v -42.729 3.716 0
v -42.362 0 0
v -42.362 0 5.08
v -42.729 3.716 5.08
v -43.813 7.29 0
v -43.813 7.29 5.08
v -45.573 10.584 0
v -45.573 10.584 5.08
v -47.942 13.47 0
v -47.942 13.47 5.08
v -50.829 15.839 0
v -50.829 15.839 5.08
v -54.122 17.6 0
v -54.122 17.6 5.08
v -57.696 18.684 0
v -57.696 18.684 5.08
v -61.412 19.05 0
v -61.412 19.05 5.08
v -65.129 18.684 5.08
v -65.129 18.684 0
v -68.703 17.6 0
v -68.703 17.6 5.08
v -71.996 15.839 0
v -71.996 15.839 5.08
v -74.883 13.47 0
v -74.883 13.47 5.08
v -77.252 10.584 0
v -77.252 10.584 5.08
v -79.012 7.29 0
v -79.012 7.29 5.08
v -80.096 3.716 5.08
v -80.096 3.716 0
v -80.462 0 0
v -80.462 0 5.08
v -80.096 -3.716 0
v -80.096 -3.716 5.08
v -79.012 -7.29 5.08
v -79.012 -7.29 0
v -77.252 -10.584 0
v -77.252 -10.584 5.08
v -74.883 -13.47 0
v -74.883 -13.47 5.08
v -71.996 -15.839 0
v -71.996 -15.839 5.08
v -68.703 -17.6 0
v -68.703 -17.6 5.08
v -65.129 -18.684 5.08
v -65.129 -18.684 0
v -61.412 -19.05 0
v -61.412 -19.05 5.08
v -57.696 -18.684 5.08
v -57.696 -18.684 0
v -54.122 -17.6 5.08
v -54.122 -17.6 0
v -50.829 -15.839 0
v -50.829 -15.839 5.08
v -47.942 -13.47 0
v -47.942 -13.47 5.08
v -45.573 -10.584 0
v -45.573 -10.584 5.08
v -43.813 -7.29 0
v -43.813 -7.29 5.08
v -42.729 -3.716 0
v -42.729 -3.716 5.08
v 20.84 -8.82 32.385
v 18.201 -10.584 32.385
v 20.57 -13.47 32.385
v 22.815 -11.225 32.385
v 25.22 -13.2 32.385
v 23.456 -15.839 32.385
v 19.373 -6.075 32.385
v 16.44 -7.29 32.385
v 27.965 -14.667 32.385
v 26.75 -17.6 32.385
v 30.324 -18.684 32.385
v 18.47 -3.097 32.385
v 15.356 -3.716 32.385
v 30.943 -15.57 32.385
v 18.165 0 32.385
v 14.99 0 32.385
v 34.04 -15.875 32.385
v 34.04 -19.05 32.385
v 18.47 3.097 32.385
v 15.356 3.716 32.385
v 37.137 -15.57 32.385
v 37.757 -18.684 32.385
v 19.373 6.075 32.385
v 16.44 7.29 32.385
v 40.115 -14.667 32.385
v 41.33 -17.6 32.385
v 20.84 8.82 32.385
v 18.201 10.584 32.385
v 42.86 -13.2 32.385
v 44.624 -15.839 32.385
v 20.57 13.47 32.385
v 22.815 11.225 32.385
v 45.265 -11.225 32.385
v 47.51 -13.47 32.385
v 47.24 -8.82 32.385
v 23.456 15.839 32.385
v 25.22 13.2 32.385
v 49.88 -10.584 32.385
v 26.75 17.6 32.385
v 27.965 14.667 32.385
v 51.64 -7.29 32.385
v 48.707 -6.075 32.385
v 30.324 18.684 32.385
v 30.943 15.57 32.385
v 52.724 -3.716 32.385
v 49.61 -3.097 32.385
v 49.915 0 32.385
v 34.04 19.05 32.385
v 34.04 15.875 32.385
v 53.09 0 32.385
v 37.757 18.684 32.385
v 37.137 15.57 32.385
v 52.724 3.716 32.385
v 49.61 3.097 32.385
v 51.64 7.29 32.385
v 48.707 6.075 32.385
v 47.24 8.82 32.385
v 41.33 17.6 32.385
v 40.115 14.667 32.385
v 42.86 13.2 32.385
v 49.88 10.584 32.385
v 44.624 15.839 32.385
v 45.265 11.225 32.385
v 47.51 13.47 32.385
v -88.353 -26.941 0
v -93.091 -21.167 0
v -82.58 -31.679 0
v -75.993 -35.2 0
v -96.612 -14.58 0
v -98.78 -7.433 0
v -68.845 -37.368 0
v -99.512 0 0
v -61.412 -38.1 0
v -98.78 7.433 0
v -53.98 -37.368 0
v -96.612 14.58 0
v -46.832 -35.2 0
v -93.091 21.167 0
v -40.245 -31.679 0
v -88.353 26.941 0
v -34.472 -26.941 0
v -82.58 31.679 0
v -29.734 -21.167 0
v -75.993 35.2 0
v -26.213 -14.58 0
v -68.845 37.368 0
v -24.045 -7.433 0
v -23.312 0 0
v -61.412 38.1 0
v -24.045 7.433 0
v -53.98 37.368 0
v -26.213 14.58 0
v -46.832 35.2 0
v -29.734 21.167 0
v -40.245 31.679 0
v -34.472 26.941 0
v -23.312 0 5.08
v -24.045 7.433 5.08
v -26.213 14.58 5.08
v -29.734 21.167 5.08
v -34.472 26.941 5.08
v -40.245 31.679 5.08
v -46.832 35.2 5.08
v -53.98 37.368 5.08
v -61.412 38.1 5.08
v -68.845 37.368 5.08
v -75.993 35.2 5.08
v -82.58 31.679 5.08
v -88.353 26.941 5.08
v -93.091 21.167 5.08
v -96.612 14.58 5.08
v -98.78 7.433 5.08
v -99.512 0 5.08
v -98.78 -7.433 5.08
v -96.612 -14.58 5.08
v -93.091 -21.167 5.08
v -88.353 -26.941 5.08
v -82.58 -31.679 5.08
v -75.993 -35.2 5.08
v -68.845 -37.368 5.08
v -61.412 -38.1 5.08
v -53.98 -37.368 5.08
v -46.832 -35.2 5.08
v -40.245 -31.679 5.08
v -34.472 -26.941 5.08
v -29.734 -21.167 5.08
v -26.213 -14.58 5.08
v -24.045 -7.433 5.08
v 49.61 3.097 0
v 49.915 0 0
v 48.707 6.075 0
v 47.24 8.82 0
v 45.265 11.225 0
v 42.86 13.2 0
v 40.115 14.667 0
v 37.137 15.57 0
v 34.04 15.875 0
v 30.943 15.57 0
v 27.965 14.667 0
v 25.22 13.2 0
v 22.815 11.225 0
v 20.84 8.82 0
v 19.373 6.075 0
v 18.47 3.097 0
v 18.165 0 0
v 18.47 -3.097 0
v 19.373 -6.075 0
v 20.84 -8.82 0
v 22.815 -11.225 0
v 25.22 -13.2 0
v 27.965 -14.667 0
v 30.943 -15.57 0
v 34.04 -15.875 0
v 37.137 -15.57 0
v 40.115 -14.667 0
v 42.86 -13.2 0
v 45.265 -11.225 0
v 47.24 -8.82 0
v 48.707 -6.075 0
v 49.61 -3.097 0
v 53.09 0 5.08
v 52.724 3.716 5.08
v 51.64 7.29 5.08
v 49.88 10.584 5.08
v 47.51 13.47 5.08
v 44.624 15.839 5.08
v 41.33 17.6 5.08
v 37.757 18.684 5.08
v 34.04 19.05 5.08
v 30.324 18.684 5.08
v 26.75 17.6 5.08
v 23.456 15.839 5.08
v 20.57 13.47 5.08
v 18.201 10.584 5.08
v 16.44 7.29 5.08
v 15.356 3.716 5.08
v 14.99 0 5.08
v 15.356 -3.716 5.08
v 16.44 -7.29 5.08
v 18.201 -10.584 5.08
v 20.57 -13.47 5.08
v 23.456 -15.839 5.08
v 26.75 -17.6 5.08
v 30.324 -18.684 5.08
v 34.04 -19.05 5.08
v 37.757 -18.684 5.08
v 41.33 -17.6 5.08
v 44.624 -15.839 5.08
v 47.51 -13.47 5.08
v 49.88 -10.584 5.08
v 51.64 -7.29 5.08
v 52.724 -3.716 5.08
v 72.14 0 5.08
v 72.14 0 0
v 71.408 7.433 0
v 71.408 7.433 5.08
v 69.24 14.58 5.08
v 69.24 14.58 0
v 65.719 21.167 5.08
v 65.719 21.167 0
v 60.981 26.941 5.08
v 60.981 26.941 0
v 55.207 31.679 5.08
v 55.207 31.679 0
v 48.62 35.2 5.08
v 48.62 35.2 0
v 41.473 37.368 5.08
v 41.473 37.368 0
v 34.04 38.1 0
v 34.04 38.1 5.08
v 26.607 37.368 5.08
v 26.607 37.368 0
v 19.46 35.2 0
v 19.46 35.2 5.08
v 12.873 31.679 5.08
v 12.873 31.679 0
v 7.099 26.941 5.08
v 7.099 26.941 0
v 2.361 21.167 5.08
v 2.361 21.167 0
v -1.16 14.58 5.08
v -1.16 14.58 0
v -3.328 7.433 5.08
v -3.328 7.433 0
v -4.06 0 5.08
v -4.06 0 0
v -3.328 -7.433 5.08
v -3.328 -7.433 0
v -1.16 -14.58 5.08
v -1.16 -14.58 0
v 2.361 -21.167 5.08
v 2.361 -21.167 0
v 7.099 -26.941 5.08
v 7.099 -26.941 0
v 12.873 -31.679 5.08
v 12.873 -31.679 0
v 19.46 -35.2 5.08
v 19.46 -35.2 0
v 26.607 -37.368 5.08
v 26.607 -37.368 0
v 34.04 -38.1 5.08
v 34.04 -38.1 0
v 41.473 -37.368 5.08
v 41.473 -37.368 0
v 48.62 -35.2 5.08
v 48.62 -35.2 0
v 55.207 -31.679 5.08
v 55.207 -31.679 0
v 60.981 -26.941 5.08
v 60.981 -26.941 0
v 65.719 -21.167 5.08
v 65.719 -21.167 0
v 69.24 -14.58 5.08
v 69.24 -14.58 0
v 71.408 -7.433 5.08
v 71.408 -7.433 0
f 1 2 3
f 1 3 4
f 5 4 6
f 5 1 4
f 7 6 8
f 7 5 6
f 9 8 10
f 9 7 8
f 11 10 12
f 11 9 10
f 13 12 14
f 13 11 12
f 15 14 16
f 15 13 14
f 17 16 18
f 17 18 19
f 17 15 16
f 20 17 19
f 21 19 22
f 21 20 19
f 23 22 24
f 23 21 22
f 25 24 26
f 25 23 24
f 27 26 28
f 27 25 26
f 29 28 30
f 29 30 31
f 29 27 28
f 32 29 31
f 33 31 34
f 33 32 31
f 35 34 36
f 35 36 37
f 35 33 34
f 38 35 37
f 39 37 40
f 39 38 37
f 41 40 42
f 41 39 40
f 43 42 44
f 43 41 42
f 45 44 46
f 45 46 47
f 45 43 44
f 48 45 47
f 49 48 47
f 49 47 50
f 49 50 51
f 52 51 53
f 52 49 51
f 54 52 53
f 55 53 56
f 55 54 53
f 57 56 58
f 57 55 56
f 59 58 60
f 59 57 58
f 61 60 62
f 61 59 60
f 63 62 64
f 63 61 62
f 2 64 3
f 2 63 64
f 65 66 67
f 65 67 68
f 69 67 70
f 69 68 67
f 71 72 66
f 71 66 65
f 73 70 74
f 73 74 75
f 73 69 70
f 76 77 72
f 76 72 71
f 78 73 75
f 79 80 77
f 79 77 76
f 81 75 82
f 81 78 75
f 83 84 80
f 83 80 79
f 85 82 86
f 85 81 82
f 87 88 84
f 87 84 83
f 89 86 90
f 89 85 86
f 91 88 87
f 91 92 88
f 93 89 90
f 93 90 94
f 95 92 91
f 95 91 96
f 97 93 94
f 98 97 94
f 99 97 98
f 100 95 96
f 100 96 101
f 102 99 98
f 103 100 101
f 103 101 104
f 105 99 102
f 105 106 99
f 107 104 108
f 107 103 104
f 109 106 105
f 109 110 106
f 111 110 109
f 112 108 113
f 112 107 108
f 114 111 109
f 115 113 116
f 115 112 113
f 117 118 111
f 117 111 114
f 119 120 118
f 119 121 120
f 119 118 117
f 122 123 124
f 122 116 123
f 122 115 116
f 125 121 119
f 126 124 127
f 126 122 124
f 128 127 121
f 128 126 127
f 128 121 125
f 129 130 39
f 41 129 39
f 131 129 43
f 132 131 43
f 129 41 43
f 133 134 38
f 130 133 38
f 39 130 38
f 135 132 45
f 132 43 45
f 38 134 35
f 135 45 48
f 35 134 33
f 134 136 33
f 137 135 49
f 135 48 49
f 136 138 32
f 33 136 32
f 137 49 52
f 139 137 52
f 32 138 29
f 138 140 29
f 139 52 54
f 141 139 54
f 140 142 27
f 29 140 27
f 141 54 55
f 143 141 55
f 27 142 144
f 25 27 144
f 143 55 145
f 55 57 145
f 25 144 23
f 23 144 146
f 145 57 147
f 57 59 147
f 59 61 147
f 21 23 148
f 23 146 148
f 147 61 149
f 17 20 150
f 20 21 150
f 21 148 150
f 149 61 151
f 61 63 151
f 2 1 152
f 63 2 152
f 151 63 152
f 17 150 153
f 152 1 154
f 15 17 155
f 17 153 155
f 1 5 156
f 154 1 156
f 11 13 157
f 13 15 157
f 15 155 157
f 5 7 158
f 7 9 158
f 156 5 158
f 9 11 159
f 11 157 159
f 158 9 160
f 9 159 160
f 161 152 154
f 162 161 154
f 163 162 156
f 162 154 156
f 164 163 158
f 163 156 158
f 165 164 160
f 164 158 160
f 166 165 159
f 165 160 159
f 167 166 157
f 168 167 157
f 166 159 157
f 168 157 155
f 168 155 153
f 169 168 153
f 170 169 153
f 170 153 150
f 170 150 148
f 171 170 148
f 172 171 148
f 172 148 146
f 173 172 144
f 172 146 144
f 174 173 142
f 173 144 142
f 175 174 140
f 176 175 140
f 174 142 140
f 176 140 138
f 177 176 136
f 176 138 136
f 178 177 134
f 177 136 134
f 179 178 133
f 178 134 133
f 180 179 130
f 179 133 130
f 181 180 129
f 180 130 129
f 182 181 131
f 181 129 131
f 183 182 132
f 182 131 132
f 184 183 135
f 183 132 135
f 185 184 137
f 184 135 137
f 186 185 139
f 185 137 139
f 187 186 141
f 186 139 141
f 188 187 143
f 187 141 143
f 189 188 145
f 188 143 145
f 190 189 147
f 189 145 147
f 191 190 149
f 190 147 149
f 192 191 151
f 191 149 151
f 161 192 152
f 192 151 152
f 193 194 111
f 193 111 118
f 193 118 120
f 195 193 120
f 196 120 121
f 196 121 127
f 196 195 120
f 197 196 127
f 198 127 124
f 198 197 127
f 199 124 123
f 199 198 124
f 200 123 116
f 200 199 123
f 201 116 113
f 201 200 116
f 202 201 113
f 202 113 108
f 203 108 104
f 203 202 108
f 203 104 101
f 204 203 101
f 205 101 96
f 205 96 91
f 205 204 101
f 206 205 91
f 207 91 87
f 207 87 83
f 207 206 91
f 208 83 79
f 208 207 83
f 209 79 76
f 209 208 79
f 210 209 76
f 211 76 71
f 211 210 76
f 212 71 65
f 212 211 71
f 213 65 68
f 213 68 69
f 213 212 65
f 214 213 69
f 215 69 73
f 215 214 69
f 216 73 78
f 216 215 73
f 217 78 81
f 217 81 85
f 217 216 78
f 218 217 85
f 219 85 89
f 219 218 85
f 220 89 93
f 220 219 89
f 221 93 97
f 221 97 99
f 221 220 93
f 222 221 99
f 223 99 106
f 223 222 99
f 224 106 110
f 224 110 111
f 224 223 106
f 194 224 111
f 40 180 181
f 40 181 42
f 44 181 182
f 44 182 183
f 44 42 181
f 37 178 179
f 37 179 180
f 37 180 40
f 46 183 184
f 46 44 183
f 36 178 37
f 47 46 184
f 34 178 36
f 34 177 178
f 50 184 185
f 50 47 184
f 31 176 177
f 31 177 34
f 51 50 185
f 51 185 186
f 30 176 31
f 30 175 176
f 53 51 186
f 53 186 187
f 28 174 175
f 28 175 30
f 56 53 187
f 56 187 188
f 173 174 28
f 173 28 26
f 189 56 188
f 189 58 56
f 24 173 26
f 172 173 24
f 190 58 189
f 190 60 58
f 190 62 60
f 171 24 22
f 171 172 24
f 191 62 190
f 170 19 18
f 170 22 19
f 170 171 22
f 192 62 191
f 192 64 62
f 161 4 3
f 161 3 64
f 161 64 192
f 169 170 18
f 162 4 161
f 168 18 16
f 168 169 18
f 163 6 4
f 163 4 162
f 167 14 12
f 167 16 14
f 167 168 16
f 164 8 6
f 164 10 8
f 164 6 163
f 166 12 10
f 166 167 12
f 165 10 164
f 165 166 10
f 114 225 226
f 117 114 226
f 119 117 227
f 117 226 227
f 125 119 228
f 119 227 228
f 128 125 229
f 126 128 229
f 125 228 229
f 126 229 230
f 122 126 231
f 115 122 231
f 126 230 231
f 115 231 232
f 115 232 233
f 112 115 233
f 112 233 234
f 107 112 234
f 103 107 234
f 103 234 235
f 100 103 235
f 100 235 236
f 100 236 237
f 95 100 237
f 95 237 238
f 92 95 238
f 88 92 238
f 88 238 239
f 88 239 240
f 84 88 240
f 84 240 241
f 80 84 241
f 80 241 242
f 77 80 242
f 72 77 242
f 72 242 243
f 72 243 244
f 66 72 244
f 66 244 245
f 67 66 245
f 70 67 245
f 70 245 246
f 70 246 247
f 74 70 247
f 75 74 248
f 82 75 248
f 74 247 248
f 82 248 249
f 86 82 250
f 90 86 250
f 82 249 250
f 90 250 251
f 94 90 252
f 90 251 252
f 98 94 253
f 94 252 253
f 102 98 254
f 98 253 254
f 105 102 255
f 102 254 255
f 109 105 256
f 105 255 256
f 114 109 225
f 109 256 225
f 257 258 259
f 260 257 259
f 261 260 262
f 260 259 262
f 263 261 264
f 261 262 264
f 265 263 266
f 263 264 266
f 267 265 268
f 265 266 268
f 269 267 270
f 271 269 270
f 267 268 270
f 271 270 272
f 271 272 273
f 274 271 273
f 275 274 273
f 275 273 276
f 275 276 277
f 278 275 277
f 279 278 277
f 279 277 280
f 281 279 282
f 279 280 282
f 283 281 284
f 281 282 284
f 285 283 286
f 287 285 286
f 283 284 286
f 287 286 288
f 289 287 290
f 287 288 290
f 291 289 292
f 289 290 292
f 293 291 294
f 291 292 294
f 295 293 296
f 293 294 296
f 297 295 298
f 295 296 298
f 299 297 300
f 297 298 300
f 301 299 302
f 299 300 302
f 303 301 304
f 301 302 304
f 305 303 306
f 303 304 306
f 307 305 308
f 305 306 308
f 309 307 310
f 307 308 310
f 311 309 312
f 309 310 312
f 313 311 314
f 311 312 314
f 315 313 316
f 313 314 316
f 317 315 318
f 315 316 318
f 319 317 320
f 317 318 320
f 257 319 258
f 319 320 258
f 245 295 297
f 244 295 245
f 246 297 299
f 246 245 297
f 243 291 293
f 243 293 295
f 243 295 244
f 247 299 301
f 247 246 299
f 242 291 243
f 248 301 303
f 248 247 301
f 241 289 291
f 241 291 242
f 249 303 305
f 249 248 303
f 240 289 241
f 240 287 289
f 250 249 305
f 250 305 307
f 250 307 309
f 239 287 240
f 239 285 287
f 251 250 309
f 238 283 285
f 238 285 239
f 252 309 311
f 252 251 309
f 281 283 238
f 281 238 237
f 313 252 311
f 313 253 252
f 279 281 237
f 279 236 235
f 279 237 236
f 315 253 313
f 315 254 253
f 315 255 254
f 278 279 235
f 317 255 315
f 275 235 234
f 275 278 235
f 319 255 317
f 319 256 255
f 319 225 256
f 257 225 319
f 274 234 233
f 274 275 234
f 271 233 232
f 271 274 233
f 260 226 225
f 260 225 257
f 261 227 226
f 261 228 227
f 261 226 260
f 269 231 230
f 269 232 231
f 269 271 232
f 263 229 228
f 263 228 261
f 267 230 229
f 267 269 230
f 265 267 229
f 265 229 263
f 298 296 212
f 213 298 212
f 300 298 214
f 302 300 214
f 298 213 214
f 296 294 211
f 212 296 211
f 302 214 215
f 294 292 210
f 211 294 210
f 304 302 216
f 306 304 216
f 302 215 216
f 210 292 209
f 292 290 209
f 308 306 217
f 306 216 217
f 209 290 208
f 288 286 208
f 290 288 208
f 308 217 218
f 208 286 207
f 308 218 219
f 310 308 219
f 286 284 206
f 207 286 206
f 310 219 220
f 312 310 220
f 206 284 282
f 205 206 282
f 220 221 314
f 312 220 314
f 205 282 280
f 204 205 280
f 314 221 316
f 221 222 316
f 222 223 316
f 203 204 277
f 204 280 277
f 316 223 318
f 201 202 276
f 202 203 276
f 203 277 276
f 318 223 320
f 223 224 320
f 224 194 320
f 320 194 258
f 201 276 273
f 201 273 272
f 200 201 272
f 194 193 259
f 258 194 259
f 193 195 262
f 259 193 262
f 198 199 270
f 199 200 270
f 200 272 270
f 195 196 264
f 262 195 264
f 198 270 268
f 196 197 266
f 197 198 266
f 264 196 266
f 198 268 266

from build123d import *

# Parameters (mm, degrees)
F0_R     = 38.1
F0_R_2   = 19.05
F1_DEPTH = 5.08
F0_R_3   = 15.875
F2_DEPTH = 32.385


with BuildPart() as f1:
    # F0 (on Top) → F1 (new body)
    with BuildSketch(Plane.XY):
        with Locations((34.040067, 0)):
            Circle(F0_R)
        with Locations((34.040067, 0)):
            Circle(F0_R_2, mode=Mode.SUBTRACT)
        with Locations((-61.412497, 0)):
            Circle(F0_R)
        with Locations((-61.412497, 0)):
            Circle(F0_R_2, mode=Mode.SUBTRACT)
    extrude(amount=F1_DEPTH)

    # F0 (on Top) → F2 (join)
    with BuildSketch(Plane.XY):
        with Locations((34.040067, 0)):
            Circle(F0_R_2)
        with Locations((34.040067, 0)):
            Circle(F0_R_3, mode=Mode.SUBTRACT)
    extrude(amount=F2_DEPTH)


solid = f1.part
